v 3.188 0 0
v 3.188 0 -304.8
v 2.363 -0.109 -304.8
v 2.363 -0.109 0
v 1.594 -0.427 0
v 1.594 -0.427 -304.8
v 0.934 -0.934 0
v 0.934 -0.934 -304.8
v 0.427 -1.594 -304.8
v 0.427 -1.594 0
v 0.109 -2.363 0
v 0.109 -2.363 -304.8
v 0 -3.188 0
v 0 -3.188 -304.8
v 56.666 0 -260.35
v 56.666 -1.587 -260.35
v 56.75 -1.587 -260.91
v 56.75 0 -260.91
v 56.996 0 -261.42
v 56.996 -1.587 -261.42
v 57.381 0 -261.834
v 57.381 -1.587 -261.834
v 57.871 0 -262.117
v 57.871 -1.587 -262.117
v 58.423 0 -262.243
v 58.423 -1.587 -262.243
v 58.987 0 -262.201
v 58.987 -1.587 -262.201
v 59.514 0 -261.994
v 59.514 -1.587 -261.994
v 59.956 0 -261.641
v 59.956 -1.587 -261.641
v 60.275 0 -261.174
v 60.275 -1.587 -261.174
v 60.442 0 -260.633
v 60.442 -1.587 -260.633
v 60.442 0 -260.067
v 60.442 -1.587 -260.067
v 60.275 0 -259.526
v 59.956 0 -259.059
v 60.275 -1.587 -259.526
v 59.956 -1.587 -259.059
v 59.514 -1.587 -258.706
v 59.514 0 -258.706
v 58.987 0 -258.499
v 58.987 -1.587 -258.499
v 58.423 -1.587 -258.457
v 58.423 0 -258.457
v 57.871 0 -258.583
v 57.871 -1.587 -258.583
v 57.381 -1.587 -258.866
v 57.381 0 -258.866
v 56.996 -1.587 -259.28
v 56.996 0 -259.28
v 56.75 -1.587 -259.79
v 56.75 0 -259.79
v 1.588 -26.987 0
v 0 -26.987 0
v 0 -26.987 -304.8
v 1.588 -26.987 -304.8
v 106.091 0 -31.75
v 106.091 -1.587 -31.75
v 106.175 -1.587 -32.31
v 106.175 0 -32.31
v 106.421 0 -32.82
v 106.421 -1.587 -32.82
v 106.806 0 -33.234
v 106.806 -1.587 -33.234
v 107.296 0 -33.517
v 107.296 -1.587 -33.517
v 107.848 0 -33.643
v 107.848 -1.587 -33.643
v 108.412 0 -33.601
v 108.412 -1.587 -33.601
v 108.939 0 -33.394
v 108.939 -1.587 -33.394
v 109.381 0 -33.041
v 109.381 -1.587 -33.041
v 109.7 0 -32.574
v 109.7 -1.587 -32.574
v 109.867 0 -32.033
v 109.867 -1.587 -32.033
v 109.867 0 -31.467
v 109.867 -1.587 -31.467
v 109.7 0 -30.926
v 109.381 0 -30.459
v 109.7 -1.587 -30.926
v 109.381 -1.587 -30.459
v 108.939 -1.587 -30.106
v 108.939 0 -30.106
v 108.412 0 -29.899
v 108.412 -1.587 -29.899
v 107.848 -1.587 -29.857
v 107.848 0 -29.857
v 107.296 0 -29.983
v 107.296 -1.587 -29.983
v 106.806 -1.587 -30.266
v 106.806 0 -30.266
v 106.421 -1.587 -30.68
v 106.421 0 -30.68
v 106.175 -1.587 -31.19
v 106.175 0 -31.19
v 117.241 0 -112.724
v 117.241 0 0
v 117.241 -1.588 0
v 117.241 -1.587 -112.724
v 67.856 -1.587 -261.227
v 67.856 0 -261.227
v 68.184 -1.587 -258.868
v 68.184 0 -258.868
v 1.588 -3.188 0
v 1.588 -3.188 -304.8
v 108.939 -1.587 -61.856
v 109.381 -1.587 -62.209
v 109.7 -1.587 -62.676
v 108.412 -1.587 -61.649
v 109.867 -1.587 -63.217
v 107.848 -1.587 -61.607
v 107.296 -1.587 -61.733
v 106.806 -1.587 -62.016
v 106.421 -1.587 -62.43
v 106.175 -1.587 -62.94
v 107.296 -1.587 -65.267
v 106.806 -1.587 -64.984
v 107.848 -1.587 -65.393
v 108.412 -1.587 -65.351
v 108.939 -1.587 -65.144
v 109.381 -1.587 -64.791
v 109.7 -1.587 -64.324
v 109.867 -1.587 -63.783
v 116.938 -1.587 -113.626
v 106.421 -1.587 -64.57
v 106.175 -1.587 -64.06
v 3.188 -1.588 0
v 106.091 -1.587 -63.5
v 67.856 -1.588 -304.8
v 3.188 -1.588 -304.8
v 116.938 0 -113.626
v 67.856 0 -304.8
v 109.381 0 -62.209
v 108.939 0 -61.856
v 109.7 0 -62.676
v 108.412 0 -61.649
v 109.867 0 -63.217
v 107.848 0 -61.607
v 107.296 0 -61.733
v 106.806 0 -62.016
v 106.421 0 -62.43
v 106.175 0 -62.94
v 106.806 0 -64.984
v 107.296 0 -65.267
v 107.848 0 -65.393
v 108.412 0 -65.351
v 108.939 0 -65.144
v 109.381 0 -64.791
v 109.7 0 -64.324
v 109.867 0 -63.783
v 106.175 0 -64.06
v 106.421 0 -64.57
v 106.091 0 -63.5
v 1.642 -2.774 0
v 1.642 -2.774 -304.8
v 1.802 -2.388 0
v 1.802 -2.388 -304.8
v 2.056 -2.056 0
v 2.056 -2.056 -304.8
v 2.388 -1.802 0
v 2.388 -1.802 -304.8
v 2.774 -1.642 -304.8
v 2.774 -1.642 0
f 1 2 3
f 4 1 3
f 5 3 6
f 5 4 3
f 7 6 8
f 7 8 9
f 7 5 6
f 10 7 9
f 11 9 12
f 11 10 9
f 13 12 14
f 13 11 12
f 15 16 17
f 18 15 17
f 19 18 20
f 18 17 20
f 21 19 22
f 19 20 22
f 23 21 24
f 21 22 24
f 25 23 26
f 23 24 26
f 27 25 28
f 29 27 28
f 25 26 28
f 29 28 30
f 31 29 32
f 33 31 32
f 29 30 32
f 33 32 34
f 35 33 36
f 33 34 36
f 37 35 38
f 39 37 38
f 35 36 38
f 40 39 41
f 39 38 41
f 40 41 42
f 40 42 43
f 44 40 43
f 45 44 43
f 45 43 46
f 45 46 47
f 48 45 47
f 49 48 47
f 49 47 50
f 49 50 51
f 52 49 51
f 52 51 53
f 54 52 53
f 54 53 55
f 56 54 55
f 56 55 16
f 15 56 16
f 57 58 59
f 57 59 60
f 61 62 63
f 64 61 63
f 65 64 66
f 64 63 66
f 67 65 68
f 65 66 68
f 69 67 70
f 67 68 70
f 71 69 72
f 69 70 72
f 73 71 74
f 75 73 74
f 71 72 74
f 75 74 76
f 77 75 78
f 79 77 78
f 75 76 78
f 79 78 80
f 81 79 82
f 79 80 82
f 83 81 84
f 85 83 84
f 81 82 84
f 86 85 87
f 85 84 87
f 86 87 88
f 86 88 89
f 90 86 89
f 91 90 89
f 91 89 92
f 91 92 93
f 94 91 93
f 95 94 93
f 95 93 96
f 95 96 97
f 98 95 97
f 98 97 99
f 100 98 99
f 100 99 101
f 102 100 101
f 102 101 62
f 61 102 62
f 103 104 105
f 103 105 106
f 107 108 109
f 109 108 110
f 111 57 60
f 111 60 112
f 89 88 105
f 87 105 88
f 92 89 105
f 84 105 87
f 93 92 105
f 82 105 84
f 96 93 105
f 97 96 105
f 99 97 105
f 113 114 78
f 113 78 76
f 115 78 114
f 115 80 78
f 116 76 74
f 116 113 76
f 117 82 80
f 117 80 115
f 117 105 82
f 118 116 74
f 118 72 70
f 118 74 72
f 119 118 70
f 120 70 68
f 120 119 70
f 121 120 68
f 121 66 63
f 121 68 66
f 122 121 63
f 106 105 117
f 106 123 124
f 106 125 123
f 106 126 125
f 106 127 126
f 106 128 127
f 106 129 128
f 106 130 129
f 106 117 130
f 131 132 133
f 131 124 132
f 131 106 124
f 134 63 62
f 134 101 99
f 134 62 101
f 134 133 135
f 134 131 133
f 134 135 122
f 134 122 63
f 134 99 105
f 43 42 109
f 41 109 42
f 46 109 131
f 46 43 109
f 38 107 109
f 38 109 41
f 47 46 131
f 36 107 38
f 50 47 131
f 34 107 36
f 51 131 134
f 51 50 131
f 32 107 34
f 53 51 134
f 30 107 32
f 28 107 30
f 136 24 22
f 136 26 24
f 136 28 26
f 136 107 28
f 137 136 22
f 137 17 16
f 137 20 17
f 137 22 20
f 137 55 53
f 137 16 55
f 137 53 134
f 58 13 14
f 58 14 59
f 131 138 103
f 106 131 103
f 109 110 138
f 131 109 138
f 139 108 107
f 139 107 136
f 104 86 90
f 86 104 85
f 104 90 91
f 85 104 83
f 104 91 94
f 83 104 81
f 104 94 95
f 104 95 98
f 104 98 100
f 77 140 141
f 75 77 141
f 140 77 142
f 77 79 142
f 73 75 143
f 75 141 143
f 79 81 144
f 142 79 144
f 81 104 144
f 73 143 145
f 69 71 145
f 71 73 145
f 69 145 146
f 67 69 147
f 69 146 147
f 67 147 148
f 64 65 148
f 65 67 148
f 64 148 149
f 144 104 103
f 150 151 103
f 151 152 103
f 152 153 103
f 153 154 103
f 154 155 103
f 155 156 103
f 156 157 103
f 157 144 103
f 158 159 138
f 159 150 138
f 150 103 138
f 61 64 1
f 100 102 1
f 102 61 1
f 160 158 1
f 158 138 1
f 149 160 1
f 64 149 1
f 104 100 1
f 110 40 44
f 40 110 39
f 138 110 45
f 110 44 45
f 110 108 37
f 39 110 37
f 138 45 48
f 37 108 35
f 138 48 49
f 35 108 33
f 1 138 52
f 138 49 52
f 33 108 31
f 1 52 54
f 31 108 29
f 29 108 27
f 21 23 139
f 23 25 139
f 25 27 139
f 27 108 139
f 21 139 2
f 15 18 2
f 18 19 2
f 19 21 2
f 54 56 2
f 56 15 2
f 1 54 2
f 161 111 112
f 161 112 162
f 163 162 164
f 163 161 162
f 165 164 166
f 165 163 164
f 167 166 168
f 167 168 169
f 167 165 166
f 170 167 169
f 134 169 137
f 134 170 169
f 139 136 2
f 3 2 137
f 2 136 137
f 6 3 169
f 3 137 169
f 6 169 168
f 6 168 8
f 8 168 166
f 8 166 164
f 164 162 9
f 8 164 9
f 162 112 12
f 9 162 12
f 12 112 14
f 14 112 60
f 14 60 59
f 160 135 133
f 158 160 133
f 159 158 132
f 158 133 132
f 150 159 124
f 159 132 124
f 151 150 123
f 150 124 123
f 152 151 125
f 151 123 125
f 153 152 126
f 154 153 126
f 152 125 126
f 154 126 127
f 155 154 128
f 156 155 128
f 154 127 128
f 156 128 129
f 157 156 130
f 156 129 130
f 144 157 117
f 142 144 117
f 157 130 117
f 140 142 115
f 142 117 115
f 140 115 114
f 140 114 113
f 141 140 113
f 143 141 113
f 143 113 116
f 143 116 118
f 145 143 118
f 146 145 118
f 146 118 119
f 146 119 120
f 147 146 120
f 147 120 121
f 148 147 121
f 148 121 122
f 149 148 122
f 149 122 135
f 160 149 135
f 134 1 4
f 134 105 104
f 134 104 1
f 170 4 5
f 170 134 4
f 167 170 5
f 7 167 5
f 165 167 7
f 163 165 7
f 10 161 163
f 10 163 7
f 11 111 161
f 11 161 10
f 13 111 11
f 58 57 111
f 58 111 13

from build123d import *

# Parameters (mm, degrees)
BASE_FLANGE1_DEPTH           = 1.5875
EDGE_FLANGE1_STRIP_W         = 9.5504
EDGE_FLANGE1_STRIP_H         = 1.5875
EDGE_FLANGE1_STRIP_CUT_DEPTH = 304.8
EDGE_FLANGE1_DEPTH           = 304.8
CUT_EXTRUDE1_DEPTH           = 342.722050796
CUT_EXTRUDE1_DEPTH_BACK      = 342.722050796
F_6_CLEARANCE_HOLE1_D        = 3.7973
F_6_CLEARANCE_HOLE2_D        = 3.7973


# Sheet-metal steps are written as plain solids
with BuildPart() as part:
    # Sketch1 → Base-Flange1 (new body)
    with BuildSketch(Plane(origin=(0, 0, 0), x_dir=(1, 0, 0), z_dir=(0, 1, 0))):
        Polygon((0, 304.8), (76.2, 304.8), (152.4, 0), (0, 0), align=None)
    extrude(amount=-BASE_FLANGE1_DEPTH)

    # Edge-Flange1 strip (across the edge) → Edge-Flange1 strip cut (cut)
    with BuildSketch(Plane(origin=(0, -1.5875, 0), x_dir=(1, 0, 0), z_dir=(0, 0, -1))):
        with Locations((-1.5875, -0.79375)):
            Rectangle(EDGE_FLANGE1_STRIP_W, EDGE_FLANGE1_STRIP_H)
    extrude(amount=EDGE_FLANGE1_STRIP_CUT_DEPTH, mode=Mode.SUBTRACT)

    # Edge-Flange1 section (across the edge) → Edge-Flange1 (add)
    with BuildSketch(Plane(origin=(0, -1.5875, 0), x_dir=(1, 0, 0), z_dir=(0, 0, -1))):
        with BuildLine():
            Line((0, 1.6002), (0, 25.4))
            Line((0, 25.4), (1.5875, 25.4))
            Line((1.5875, 25.4), (1.5875, 1.6002))
            ThreePointArc((1.5875, 1.6002), (2.056187729, 0.468687729), (3.1877, 0))
            Line((3.1877, 0), (3.1877, -1.5875))
            ThreePointArc((3.1877, -1.5875), (0.933655714, -0.653844286), (0, 1.6002))
        make_face()
    extrude(amount=EDGE_FLANGE1_DEPTH)

    # Sketch9 → Cut-Extrude1 (cut, two sides: drawn at the far end of the back side and taken through both)
    with BuildSketch(Plane(origin=(0, -1.5875, 0), x_dir=(-1, 0, 0), z_dir=(0, -1, 0)).offset(-CUT_EXTRUDE1_DEPTH_BACK)):
        Polygon((-67.85590566, 967.941443334), (-67.85590566, 304.8), (-67.85590566, 261.227267277), (-68.183918061, 258.867768839), (-116.937952517, 113.626422367), (-117.240761897, 112.724334108), (-117.240761897, 0), (-117.240761897, -663.141443334), (-1442.916152839, -623.003514641), (-1393.531296603, 1008.079372028), align=None)
    extrude(amount=CUT_EXTRUDE1_DEPTH + CUT_EXTRUDE1_DEPTH_BACK, mode=Mode.SUBTRACT)

    # #6 Clearance Hole1 (through all)
    with Locations(Plane(origin=(0, 0, 0), x_dir=(1, 0, 0), z_dir=(0, 1, 0))):
        with Locations((58.564398425, 260.349999742)):
            Hole(F_6_CLEARANCE_HOLE1_D / 2)

    # #6 Clearance Hole2 (through all)
    with Locations(Plane(origin=(0, 0, 0), x_dir=(1, 0, 0), z_dir=(0, 1, 0))):
        with Locations((107.989583034, 31.750001764), (107.989583034, 63.500001764)):
            Hole(F_6_CLEARANCE_HOLE2_D / 2)


solid = part.part
